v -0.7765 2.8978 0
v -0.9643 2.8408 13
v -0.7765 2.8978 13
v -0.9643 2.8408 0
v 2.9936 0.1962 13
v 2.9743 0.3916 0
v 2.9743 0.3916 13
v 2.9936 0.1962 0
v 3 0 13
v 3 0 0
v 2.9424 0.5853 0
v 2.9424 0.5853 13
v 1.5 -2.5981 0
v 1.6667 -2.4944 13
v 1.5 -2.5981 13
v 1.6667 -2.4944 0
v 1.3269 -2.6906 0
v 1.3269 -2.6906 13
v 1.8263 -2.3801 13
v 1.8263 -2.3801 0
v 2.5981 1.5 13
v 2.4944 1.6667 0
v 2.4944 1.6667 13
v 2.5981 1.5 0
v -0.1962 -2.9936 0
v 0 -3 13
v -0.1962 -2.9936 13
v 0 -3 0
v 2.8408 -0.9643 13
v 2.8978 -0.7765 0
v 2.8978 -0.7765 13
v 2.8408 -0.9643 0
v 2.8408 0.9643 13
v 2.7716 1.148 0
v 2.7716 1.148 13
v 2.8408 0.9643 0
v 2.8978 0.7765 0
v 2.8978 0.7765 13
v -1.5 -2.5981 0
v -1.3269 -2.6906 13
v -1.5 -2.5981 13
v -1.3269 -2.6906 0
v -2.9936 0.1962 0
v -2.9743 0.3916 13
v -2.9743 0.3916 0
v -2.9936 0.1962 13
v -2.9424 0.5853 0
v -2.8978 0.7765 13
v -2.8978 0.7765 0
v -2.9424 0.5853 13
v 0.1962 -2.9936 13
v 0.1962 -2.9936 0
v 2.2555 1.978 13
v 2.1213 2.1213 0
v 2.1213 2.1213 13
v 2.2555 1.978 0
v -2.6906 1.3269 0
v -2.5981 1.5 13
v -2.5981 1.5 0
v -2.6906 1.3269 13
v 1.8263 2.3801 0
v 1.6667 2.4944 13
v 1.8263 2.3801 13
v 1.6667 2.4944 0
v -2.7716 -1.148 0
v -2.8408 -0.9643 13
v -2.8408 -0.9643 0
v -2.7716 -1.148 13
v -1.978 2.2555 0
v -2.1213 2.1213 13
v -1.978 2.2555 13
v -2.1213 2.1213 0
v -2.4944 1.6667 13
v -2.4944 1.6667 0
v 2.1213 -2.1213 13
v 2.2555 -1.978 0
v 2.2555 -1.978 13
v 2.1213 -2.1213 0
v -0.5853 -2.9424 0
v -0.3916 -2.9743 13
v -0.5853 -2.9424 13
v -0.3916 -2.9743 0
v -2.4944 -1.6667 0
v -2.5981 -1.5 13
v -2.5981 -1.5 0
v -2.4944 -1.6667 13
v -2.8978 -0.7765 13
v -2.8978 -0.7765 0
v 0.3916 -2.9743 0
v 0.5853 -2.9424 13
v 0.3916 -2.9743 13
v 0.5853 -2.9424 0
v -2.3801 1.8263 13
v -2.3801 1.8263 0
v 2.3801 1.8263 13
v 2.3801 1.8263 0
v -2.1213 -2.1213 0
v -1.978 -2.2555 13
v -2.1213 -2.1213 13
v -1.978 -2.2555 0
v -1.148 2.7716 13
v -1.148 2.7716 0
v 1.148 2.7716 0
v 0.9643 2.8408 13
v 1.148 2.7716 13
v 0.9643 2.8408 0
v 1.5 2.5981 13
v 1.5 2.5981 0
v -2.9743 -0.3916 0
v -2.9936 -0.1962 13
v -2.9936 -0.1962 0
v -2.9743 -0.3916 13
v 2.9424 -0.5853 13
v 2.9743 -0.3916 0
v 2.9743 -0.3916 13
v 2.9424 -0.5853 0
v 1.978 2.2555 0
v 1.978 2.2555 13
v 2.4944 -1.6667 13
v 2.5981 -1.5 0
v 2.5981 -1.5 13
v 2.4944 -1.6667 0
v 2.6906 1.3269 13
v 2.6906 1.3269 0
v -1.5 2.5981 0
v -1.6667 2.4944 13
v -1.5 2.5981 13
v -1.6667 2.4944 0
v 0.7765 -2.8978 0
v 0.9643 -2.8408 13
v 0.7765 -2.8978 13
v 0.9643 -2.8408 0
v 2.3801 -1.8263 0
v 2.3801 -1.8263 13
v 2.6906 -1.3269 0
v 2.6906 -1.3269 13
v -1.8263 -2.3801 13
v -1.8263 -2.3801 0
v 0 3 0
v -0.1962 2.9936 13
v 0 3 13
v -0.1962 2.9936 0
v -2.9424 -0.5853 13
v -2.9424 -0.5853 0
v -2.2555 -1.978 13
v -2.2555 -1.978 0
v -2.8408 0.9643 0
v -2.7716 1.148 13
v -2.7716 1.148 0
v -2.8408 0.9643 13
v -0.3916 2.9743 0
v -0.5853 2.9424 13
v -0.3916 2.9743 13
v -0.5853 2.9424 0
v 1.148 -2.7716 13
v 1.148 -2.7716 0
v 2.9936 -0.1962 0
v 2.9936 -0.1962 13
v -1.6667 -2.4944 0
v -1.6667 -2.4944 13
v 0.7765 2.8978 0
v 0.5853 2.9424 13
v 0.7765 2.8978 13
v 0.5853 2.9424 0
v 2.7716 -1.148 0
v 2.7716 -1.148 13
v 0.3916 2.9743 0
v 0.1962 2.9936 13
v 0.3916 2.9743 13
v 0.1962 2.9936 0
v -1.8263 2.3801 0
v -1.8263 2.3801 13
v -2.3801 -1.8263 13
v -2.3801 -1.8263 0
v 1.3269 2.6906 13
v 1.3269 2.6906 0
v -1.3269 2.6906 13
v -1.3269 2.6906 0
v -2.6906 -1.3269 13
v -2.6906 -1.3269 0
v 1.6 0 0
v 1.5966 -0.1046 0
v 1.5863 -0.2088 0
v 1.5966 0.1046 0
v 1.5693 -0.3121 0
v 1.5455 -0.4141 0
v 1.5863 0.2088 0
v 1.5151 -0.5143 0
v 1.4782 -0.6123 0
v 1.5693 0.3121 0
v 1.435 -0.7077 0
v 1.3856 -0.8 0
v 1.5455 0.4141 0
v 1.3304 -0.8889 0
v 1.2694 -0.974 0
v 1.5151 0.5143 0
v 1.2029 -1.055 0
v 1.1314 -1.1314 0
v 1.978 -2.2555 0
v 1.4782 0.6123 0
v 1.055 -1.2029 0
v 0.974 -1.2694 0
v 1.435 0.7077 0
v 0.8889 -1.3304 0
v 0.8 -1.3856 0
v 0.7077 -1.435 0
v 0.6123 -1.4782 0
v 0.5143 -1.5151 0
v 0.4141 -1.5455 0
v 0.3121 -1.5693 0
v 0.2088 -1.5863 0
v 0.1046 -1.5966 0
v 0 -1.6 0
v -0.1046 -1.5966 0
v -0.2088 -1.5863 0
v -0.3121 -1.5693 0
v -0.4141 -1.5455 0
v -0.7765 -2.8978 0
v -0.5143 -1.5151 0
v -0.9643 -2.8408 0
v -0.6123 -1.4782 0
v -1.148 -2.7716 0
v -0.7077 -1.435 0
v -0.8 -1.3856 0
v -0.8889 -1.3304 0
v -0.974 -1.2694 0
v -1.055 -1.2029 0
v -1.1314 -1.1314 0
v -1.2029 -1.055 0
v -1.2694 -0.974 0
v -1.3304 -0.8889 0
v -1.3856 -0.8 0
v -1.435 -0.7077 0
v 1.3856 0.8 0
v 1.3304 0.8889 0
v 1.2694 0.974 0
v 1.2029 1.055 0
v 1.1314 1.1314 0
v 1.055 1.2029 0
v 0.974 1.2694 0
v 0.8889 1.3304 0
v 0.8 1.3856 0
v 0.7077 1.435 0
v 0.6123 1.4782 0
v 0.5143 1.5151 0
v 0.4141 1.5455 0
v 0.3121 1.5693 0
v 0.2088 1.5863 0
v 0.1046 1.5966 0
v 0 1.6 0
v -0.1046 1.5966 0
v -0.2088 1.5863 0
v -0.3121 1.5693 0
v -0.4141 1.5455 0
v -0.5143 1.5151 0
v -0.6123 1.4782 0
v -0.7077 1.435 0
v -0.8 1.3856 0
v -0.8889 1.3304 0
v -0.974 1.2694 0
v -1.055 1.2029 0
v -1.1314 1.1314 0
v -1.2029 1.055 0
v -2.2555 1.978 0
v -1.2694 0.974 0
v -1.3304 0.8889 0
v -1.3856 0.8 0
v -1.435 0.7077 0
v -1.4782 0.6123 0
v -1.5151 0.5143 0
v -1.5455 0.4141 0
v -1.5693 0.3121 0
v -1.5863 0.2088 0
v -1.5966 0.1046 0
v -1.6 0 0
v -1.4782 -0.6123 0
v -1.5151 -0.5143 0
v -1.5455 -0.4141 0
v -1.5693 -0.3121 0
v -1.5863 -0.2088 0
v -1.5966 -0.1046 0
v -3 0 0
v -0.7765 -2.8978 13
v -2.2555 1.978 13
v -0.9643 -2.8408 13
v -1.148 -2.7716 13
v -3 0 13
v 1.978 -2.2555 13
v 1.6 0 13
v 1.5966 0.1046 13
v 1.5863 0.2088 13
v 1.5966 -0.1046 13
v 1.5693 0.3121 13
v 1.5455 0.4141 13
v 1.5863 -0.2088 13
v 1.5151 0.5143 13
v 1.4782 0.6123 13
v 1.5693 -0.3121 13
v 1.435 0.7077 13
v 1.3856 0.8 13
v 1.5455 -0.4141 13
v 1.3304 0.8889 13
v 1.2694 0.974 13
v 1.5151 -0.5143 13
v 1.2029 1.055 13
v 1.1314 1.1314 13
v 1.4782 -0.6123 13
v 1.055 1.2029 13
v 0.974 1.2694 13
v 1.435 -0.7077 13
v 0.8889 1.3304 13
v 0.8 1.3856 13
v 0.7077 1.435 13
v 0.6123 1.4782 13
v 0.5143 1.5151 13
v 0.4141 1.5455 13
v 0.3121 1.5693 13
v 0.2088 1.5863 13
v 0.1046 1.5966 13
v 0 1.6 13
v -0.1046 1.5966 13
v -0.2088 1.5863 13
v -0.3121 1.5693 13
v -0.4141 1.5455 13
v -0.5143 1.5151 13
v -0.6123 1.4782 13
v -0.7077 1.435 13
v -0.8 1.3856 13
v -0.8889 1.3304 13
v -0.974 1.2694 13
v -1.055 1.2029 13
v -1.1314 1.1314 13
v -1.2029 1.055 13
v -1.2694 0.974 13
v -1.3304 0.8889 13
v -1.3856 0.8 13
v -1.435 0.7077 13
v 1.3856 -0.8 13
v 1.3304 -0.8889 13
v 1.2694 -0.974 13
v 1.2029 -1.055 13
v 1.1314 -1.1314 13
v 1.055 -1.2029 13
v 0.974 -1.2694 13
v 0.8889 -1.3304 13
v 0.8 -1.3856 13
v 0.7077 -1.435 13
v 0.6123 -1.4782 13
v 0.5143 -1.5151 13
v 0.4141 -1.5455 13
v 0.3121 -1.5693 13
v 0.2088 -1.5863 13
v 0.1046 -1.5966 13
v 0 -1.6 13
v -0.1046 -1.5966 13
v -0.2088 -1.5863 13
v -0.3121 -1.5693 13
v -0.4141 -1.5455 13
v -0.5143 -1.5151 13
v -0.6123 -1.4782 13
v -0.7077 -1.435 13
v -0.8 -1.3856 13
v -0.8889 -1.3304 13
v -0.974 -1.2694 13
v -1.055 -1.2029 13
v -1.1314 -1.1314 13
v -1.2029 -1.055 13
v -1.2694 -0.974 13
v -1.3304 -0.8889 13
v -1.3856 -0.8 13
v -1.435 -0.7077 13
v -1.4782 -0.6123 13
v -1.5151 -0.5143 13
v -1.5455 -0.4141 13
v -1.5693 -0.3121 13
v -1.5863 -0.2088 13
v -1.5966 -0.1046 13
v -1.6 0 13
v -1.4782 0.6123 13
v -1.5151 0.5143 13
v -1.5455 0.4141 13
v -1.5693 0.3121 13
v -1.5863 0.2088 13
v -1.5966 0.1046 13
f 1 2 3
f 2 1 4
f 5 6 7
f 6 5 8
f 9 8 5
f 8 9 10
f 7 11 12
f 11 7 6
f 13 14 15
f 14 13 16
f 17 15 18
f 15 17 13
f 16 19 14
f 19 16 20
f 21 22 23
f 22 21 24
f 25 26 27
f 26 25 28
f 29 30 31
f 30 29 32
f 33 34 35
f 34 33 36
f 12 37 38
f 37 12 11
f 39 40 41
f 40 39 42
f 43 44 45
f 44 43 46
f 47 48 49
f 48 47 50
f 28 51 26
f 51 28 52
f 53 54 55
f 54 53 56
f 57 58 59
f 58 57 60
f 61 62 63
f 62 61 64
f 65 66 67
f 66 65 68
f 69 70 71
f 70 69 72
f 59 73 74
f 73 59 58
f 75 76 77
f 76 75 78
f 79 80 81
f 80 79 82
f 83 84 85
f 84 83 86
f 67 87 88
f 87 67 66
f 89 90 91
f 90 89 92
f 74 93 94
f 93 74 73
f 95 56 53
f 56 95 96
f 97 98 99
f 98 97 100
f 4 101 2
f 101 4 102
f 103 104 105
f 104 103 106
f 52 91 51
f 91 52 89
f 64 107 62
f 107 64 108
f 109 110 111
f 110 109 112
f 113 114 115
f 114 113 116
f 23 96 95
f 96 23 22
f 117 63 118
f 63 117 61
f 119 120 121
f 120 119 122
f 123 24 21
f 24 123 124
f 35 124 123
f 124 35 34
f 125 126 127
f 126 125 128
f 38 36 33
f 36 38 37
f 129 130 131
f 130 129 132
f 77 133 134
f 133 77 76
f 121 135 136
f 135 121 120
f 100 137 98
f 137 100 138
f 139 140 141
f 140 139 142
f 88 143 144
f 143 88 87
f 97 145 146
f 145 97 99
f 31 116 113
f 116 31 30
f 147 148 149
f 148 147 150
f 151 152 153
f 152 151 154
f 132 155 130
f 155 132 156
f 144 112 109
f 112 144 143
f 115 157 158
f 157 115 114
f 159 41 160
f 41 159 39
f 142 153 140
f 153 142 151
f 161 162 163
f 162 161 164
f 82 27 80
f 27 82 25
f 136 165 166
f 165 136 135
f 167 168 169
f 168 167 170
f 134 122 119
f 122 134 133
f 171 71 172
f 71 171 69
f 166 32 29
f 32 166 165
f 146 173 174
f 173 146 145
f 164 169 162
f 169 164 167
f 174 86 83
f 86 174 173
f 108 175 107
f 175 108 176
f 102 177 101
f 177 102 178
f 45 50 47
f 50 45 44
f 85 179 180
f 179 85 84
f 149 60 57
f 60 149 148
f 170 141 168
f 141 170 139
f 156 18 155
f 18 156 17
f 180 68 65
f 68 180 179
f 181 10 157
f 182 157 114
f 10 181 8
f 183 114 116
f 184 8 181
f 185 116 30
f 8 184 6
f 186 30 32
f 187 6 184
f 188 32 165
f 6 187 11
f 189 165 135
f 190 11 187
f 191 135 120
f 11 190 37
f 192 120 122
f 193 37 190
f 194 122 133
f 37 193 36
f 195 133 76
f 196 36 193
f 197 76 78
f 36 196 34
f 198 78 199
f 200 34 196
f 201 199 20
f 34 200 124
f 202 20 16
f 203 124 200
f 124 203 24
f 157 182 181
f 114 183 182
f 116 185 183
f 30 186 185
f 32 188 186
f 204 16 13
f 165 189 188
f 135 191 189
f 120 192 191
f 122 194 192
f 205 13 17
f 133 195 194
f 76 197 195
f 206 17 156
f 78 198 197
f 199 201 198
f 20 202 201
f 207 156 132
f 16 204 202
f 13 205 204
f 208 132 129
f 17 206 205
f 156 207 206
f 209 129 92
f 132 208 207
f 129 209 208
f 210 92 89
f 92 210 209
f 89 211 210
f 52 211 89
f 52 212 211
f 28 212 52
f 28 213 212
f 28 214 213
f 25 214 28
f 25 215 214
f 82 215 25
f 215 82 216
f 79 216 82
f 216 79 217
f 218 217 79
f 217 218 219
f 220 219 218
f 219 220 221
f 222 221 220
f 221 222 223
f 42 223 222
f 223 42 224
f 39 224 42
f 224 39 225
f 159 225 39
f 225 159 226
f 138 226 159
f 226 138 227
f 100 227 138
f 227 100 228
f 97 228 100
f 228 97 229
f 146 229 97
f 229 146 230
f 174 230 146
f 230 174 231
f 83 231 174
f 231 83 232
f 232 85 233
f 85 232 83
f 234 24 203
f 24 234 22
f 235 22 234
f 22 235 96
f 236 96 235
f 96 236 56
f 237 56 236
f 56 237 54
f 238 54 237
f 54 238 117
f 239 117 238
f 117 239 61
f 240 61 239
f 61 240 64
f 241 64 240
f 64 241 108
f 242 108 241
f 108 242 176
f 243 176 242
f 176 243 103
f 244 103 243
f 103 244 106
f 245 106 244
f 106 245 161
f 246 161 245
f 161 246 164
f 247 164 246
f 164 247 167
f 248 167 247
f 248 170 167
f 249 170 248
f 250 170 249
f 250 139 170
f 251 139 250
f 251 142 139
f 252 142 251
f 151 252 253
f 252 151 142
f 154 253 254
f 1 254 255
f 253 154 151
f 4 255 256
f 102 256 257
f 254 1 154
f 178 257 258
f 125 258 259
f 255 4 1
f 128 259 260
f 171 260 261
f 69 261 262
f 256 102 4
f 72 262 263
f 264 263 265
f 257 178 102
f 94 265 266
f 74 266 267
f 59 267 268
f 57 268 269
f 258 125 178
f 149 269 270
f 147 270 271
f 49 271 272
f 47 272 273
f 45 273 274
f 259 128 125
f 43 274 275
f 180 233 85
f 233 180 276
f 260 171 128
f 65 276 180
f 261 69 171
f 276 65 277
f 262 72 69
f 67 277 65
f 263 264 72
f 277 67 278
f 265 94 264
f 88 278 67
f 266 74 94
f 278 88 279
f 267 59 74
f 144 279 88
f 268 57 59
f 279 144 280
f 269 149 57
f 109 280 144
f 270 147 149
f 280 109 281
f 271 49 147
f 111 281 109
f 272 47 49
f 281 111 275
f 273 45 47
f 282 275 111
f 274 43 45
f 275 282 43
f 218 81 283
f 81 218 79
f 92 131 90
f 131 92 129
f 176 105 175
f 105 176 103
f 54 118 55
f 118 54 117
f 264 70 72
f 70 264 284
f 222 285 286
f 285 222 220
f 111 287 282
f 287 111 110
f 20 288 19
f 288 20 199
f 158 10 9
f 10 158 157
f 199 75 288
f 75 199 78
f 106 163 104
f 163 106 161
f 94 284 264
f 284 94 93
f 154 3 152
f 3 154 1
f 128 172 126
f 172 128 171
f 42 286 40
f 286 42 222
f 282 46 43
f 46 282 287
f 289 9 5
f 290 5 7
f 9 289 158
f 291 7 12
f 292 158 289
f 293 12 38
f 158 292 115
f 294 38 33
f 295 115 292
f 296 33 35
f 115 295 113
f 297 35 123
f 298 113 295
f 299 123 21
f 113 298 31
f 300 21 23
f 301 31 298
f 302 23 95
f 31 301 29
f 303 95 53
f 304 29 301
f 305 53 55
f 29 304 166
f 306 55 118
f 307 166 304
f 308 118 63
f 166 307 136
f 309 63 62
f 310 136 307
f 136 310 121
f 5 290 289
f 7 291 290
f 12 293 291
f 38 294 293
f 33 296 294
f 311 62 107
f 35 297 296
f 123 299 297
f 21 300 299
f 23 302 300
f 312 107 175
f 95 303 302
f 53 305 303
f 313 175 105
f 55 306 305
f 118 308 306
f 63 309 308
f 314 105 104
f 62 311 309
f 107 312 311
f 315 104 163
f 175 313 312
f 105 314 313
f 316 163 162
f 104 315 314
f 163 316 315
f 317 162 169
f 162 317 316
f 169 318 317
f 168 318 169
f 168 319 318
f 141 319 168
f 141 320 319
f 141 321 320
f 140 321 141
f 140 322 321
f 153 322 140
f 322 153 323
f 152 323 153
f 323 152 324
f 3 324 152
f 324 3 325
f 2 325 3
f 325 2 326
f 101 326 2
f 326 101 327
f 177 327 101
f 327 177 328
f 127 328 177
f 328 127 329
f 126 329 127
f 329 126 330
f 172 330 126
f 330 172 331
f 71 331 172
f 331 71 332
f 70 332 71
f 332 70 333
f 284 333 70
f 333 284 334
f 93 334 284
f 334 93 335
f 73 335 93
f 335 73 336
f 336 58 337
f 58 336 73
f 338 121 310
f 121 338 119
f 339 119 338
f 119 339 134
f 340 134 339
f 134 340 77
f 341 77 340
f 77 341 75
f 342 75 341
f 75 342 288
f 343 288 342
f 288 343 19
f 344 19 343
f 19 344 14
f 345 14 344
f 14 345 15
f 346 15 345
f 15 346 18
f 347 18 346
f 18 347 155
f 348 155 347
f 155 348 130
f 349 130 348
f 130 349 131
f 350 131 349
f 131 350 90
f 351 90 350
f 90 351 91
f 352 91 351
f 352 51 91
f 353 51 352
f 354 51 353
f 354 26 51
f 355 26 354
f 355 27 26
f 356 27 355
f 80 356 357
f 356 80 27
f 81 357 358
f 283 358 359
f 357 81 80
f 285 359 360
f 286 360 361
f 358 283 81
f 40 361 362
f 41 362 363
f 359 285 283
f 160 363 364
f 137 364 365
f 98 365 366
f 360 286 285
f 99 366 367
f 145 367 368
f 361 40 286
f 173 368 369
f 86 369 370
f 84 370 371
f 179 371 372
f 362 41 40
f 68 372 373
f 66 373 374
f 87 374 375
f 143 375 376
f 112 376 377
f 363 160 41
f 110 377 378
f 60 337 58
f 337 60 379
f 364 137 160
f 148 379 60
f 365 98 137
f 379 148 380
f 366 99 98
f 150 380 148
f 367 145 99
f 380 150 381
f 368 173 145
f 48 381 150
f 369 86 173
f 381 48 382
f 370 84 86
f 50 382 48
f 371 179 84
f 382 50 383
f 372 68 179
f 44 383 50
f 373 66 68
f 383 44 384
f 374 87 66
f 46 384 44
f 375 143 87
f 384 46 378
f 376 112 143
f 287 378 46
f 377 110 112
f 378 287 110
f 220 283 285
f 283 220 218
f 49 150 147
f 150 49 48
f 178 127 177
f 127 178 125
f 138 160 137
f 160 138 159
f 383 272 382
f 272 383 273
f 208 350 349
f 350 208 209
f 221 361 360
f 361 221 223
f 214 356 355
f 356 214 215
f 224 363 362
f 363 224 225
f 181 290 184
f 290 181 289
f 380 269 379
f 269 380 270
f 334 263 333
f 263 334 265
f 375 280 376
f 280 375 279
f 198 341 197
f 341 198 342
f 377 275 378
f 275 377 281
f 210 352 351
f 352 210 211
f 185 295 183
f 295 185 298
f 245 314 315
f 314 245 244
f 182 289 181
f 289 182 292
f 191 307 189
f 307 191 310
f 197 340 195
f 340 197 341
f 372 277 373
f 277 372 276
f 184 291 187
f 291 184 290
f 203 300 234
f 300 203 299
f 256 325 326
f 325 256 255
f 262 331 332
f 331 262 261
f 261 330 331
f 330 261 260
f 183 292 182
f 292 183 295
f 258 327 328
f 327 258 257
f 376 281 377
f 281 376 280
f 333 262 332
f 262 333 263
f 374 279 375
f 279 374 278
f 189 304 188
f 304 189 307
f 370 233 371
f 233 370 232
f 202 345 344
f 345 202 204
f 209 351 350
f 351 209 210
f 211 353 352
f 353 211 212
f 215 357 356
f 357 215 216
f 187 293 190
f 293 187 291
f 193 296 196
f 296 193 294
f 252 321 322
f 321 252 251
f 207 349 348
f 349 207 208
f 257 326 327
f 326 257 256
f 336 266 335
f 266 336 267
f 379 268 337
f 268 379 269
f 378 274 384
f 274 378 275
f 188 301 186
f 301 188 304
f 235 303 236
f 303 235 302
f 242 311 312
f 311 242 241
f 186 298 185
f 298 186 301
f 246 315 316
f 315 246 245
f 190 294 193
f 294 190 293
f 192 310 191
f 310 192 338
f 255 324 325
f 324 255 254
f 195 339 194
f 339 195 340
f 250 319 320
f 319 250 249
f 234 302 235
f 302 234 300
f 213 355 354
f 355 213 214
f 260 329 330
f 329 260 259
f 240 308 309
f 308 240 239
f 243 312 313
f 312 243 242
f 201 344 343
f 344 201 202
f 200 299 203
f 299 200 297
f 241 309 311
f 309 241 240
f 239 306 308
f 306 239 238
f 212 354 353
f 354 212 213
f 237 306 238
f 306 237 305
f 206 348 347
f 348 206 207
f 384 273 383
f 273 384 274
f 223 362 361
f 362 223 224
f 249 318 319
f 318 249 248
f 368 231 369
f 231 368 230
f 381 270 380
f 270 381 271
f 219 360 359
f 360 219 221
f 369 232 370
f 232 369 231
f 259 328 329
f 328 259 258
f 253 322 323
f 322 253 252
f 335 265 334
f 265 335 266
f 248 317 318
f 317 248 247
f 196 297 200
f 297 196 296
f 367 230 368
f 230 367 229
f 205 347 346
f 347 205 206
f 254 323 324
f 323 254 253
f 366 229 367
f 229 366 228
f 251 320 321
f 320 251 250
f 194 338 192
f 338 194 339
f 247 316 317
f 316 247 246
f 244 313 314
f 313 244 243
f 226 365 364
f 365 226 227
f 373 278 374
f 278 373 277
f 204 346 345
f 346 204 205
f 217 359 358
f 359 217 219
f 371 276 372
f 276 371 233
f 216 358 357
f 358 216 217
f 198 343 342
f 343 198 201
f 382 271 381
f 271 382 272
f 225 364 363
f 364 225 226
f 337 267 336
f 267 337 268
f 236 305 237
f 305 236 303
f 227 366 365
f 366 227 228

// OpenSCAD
$fn = 96;

thread_d = 3.0;      // mm (nominal)
length   = 13.0;     // mm
outer_d  = 6.0;      // mm (fallback since diameter unspecified)
hole_clearance = 0.2; // mm added to thread diameter for clearance

difference() {
  cylinder(h = length, d = outer_d);
  translate([0,0,-0.1])
    cylinder(h = length + 0.2, d = thread_d + hole_clearance);
}
